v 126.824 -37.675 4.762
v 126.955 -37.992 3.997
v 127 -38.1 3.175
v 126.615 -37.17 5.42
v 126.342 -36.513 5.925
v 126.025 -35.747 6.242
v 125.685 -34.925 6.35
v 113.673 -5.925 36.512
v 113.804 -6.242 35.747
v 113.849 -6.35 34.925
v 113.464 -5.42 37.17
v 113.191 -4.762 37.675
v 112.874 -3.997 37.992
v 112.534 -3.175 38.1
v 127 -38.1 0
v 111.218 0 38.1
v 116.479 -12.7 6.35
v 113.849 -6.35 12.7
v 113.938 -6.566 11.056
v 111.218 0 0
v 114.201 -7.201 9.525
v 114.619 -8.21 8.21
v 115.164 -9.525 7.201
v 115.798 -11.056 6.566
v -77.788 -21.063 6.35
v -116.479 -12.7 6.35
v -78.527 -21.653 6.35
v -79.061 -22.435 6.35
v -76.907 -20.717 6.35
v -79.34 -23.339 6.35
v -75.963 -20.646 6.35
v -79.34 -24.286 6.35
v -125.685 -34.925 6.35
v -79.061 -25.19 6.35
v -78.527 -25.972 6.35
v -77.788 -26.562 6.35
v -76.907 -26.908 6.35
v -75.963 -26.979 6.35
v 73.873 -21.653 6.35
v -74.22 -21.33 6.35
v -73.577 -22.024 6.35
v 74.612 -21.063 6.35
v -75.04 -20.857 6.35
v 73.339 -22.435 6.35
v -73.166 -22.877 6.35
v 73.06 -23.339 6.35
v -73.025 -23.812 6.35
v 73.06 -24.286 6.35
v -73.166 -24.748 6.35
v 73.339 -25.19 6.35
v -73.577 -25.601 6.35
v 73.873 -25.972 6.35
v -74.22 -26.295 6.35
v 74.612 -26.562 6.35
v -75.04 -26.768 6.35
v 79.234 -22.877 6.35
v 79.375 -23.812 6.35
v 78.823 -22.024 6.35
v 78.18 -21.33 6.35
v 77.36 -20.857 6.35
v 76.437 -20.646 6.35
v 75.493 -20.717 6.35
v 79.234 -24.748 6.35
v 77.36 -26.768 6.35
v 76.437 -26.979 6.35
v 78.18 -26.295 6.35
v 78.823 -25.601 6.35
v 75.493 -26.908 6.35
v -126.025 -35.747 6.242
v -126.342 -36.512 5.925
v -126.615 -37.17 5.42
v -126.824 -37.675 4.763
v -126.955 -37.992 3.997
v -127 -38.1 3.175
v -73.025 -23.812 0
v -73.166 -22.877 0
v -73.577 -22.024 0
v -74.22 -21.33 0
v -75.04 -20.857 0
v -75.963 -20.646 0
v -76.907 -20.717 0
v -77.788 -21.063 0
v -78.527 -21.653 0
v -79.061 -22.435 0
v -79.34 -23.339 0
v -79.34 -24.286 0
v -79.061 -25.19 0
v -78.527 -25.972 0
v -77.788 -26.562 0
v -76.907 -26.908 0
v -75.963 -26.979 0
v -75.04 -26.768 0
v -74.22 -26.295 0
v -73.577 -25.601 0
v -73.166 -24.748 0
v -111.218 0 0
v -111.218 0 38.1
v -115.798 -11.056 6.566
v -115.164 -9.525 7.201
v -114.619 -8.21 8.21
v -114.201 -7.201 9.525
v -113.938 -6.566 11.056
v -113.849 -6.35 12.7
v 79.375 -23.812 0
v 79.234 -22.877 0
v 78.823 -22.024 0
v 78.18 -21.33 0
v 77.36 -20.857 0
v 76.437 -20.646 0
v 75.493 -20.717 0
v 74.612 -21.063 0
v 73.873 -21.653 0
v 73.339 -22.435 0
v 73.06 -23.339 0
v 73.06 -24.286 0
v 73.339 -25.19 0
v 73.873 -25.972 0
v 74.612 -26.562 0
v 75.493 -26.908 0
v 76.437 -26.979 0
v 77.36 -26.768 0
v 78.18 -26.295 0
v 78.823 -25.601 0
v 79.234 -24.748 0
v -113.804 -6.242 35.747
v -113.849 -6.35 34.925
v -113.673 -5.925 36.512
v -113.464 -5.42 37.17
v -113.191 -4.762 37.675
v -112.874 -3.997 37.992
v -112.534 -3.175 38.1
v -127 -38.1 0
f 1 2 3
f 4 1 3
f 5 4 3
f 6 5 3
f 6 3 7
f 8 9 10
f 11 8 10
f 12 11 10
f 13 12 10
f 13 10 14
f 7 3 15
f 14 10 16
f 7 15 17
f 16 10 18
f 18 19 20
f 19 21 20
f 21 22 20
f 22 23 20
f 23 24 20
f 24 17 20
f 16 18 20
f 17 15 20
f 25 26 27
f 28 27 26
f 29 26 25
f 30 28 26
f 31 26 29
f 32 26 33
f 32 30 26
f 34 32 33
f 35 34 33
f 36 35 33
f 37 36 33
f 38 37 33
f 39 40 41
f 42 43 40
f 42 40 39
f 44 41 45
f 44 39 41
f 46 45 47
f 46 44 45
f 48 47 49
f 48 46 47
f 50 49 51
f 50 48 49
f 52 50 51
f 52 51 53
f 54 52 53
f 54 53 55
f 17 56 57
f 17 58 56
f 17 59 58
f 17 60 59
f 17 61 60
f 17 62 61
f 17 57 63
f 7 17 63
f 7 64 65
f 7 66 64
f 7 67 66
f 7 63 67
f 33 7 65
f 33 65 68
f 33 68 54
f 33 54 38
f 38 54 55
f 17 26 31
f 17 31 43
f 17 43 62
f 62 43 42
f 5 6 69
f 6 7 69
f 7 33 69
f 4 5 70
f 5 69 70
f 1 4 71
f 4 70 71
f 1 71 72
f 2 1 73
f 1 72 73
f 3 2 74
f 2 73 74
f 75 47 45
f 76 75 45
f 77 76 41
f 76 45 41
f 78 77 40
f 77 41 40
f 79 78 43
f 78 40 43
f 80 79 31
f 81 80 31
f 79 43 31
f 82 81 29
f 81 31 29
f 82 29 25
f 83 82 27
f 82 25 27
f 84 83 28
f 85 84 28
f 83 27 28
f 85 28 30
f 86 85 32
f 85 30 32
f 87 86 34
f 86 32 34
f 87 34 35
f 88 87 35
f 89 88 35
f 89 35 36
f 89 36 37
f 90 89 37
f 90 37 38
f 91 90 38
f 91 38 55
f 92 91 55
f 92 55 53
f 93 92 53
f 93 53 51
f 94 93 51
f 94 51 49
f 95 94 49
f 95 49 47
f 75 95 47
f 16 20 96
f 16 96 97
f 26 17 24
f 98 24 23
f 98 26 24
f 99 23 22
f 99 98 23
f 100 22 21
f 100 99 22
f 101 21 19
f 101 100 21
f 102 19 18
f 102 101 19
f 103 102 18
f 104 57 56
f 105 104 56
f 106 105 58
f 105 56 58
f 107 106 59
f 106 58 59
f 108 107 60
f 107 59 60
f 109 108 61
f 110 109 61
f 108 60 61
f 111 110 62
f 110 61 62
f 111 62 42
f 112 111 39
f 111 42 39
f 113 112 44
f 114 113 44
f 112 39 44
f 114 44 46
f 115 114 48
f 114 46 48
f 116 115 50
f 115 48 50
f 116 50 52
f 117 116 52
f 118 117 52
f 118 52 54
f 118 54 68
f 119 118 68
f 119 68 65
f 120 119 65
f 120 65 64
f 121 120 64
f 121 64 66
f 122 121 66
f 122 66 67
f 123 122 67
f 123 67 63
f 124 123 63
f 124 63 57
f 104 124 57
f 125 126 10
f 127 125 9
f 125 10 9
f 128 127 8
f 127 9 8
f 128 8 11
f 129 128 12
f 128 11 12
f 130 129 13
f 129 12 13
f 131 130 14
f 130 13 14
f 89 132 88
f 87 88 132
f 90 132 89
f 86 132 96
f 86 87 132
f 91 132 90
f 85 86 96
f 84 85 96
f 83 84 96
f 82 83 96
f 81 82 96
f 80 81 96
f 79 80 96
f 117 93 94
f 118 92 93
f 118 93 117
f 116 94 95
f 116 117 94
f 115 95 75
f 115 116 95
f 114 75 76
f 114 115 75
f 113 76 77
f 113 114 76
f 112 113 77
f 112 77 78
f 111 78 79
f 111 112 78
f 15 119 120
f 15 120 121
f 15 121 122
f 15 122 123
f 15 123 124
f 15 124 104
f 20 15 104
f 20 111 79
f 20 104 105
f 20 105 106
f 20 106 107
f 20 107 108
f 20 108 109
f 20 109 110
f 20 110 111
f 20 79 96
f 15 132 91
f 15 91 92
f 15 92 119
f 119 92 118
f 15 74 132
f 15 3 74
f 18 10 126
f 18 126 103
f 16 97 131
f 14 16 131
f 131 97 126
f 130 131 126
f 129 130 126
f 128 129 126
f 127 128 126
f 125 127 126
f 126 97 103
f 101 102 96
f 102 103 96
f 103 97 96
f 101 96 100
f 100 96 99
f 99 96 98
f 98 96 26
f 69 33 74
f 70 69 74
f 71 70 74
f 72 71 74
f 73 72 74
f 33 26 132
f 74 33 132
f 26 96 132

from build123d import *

# Parameters (mm, degrees)
F1_DEPTH = 127
F2_R     = 6.35
F3_R     = 3.175
F4_R     = 3.175
F5_DEPTH = 6.351
F7_DEPTH = 38.101


with BuildPart() as f1:
    # F0 (on Right) → F1 (new body, symmetric)
    with BuildSketch(Plane.YZ):
        Polygon((-38.1, 0), (0, 0), (0, 38.1), (-6.35, 38.1), (-6.35, 6.35), (-38.1, 6.35), align=None)
    extrude(amount=F1_DEPTH, both=True)

    # F2
    f2_edges = [f1.edges().sort_by_distance(p)[0] for p in [
        (0, -6.35, 6.35),
    ]]
    fillet(f2_edges, radius=F2_R)

    # F3
    f3_edges = [f1.edges().sort_by_distance(p)[0] for p in [
        (0, -6.35, 38.1),
        (0, -38.1, 6.35),
    ]]
    fillet(f3_edges, radius=F3_R)

    # F4 (on face) → F5 (cut, through all)
    with BuildSketch(Plane.XY.offset(6.35)):
        with Locations((-76.2, -23.8125)):
            Circle(F4_R)
        with Locations((76.2, -23.8125)):
            Circle(F4_R)
    extrude(amount=-F5_DEPTH, mode=Mode.SUBTRACT)

    # F6 (on face) → F7 (cut, through all)
    with BuildSketch(Plane(origin=(0, 0, 0), x_dir=(1, 0, 0), z_dir=(0, 0, -1))):
        Polygon((-111.218463, 0), (-127, 38.1), (-127, 0), align=None)
        Polygon((111.218463, 0), (127, 0), (127, 38.1), align=None)
    extrude(amount=-F7_DEPTH, mode=Mode.SUBTRACT)


solid = f1.part
